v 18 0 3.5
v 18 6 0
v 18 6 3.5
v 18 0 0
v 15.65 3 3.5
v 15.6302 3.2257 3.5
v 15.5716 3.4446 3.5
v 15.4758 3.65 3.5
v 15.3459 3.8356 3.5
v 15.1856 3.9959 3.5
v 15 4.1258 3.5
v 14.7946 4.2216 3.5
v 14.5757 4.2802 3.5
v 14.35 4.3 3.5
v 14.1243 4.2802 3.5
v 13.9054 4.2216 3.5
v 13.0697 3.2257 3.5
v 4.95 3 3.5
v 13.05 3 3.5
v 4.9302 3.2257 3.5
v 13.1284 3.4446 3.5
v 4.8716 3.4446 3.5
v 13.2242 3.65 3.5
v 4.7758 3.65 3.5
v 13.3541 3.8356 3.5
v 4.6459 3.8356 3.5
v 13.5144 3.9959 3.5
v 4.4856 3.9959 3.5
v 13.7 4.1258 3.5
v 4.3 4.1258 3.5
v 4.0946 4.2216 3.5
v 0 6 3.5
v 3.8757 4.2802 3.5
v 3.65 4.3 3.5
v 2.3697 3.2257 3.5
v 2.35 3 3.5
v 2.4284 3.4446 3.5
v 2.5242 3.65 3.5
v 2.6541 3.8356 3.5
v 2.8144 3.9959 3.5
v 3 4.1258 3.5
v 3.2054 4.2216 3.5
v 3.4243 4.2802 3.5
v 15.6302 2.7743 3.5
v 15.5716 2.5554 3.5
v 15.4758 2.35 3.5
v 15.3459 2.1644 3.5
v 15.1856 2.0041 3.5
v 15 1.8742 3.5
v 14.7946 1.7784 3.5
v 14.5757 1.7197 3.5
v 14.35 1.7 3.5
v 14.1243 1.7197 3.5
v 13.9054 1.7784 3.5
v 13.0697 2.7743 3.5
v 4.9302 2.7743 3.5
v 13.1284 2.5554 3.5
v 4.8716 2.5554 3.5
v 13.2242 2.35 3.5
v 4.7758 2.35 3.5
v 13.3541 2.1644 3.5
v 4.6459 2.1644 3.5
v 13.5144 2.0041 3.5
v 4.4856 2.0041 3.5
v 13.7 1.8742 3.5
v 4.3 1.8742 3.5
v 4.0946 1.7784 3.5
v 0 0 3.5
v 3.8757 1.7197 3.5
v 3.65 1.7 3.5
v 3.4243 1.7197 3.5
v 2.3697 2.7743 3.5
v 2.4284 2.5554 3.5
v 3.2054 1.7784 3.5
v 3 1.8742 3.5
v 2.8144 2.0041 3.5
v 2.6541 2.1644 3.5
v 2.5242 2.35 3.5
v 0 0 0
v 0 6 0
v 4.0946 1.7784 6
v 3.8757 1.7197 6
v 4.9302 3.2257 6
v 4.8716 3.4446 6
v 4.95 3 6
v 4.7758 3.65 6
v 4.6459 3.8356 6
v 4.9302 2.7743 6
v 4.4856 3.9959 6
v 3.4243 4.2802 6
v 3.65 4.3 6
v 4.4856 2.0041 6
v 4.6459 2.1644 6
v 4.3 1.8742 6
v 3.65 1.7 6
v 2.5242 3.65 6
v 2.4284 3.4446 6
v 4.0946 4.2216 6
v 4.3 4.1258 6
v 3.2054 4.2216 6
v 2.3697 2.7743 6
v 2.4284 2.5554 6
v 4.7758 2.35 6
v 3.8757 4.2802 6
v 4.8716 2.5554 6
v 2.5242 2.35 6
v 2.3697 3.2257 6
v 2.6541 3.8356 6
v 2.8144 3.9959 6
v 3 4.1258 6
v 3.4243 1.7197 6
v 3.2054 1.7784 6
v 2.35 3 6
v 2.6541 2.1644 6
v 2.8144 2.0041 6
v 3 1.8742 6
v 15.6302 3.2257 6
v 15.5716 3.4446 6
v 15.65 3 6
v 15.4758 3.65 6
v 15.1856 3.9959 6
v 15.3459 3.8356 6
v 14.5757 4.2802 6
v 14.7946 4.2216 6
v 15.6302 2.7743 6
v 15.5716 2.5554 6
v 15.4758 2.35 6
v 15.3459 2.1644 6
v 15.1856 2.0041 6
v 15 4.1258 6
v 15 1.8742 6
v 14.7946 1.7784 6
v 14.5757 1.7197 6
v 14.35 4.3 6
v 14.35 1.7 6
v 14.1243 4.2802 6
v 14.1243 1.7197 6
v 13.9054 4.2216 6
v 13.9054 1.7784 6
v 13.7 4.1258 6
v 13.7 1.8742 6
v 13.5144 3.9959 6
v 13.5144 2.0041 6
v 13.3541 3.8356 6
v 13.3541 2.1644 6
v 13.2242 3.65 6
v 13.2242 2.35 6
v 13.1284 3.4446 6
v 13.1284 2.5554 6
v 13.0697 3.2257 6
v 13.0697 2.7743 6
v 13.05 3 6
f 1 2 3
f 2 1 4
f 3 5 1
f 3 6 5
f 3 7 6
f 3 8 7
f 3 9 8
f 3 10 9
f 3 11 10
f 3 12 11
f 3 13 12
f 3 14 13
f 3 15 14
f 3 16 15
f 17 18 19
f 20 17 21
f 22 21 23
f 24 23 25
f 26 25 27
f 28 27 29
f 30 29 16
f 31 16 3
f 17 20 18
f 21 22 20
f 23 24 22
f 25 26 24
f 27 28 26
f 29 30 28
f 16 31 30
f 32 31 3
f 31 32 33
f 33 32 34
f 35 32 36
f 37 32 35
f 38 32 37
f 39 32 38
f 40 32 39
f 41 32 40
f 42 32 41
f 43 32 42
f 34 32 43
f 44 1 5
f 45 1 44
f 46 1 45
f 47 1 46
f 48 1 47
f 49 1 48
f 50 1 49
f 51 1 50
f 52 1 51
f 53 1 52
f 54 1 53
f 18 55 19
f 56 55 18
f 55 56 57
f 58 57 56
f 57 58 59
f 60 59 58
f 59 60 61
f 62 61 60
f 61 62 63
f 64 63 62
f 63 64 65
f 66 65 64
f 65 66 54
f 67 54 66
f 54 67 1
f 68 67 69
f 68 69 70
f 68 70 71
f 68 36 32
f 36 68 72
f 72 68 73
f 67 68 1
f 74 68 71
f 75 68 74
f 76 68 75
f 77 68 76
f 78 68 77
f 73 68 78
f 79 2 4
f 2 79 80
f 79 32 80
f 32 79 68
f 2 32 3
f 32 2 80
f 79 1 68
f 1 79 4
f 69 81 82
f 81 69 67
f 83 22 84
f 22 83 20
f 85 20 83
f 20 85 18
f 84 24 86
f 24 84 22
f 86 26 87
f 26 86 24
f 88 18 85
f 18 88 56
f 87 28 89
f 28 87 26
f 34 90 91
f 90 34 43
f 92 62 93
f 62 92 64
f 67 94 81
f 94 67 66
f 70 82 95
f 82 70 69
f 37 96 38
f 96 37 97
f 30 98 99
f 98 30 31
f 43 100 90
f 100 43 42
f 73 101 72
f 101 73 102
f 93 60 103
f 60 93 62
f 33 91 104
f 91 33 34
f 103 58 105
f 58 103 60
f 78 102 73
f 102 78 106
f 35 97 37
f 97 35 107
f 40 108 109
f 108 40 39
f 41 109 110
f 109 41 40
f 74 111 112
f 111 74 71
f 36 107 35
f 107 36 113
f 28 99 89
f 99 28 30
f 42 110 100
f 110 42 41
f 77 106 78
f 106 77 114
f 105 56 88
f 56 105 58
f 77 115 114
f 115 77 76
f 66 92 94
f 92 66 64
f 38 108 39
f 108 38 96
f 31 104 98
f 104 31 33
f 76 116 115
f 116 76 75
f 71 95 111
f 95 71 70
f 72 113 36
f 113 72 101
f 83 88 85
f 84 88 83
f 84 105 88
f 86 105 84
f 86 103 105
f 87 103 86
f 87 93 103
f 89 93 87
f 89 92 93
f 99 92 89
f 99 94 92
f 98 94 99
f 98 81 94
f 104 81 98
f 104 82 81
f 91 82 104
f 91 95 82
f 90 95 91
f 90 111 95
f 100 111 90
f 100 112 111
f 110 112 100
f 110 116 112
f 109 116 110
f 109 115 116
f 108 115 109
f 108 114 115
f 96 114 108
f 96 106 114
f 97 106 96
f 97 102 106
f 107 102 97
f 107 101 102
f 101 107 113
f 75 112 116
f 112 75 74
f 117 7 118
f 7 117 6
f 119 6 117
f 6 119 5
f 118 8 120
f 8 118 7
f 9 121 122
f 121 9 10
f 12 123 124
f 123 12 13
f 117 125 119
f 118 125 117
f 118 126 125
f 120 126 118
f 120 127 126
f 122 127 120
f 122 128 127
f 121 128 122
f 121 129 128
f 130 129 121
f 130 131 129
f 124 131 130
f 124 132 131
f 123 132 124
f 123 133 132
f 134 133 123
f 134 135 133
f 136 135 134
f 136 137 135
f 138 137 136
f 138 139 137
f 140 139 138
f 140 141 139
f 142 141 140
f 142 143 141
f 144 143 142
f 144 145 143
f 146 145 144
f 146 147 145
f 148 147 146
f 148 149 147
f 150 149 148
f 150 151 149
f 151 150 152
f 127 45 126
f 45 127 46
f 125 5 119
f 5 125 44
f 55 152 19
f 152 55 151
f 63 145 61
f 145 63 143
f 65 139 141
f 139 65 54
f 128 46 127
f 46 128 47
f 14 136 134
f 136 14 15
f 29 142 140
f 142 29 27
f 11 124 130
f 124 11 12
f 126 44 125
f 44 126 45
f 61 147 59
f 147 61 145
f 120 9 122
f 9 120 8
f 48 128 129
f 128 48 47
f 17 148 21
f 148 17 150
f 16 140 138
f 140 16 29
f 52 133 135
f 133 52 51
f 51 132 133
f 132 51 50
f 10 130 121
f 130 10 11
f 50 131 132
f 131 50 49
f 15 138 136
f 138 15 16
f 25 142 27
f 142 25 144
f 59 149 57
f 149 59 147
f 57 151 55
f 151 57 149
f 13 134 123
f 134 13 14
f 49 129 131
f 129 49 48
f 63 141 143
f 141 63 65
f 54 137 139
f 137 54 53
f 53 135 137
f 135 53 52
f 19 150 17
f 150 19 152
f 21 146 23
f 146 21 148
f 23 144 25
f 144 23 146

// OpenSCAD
width  = 18;
thick  = 6;
height = 3.5;

pind   = 2.6;
pinsep = 10.7;
pinlen = 2.5;

$fn = 36;

cube([width, thick, height]);
translate([(width/2) - (pinsep/2),thick/2,height]){
    cylinder(h=pinlen, d=pind);
}

cube([width, thick, height]);
translate([(width/2) + (pinsep/2),thick/2,height]){
    cylinder(h=pinlen, d=pind);
}
